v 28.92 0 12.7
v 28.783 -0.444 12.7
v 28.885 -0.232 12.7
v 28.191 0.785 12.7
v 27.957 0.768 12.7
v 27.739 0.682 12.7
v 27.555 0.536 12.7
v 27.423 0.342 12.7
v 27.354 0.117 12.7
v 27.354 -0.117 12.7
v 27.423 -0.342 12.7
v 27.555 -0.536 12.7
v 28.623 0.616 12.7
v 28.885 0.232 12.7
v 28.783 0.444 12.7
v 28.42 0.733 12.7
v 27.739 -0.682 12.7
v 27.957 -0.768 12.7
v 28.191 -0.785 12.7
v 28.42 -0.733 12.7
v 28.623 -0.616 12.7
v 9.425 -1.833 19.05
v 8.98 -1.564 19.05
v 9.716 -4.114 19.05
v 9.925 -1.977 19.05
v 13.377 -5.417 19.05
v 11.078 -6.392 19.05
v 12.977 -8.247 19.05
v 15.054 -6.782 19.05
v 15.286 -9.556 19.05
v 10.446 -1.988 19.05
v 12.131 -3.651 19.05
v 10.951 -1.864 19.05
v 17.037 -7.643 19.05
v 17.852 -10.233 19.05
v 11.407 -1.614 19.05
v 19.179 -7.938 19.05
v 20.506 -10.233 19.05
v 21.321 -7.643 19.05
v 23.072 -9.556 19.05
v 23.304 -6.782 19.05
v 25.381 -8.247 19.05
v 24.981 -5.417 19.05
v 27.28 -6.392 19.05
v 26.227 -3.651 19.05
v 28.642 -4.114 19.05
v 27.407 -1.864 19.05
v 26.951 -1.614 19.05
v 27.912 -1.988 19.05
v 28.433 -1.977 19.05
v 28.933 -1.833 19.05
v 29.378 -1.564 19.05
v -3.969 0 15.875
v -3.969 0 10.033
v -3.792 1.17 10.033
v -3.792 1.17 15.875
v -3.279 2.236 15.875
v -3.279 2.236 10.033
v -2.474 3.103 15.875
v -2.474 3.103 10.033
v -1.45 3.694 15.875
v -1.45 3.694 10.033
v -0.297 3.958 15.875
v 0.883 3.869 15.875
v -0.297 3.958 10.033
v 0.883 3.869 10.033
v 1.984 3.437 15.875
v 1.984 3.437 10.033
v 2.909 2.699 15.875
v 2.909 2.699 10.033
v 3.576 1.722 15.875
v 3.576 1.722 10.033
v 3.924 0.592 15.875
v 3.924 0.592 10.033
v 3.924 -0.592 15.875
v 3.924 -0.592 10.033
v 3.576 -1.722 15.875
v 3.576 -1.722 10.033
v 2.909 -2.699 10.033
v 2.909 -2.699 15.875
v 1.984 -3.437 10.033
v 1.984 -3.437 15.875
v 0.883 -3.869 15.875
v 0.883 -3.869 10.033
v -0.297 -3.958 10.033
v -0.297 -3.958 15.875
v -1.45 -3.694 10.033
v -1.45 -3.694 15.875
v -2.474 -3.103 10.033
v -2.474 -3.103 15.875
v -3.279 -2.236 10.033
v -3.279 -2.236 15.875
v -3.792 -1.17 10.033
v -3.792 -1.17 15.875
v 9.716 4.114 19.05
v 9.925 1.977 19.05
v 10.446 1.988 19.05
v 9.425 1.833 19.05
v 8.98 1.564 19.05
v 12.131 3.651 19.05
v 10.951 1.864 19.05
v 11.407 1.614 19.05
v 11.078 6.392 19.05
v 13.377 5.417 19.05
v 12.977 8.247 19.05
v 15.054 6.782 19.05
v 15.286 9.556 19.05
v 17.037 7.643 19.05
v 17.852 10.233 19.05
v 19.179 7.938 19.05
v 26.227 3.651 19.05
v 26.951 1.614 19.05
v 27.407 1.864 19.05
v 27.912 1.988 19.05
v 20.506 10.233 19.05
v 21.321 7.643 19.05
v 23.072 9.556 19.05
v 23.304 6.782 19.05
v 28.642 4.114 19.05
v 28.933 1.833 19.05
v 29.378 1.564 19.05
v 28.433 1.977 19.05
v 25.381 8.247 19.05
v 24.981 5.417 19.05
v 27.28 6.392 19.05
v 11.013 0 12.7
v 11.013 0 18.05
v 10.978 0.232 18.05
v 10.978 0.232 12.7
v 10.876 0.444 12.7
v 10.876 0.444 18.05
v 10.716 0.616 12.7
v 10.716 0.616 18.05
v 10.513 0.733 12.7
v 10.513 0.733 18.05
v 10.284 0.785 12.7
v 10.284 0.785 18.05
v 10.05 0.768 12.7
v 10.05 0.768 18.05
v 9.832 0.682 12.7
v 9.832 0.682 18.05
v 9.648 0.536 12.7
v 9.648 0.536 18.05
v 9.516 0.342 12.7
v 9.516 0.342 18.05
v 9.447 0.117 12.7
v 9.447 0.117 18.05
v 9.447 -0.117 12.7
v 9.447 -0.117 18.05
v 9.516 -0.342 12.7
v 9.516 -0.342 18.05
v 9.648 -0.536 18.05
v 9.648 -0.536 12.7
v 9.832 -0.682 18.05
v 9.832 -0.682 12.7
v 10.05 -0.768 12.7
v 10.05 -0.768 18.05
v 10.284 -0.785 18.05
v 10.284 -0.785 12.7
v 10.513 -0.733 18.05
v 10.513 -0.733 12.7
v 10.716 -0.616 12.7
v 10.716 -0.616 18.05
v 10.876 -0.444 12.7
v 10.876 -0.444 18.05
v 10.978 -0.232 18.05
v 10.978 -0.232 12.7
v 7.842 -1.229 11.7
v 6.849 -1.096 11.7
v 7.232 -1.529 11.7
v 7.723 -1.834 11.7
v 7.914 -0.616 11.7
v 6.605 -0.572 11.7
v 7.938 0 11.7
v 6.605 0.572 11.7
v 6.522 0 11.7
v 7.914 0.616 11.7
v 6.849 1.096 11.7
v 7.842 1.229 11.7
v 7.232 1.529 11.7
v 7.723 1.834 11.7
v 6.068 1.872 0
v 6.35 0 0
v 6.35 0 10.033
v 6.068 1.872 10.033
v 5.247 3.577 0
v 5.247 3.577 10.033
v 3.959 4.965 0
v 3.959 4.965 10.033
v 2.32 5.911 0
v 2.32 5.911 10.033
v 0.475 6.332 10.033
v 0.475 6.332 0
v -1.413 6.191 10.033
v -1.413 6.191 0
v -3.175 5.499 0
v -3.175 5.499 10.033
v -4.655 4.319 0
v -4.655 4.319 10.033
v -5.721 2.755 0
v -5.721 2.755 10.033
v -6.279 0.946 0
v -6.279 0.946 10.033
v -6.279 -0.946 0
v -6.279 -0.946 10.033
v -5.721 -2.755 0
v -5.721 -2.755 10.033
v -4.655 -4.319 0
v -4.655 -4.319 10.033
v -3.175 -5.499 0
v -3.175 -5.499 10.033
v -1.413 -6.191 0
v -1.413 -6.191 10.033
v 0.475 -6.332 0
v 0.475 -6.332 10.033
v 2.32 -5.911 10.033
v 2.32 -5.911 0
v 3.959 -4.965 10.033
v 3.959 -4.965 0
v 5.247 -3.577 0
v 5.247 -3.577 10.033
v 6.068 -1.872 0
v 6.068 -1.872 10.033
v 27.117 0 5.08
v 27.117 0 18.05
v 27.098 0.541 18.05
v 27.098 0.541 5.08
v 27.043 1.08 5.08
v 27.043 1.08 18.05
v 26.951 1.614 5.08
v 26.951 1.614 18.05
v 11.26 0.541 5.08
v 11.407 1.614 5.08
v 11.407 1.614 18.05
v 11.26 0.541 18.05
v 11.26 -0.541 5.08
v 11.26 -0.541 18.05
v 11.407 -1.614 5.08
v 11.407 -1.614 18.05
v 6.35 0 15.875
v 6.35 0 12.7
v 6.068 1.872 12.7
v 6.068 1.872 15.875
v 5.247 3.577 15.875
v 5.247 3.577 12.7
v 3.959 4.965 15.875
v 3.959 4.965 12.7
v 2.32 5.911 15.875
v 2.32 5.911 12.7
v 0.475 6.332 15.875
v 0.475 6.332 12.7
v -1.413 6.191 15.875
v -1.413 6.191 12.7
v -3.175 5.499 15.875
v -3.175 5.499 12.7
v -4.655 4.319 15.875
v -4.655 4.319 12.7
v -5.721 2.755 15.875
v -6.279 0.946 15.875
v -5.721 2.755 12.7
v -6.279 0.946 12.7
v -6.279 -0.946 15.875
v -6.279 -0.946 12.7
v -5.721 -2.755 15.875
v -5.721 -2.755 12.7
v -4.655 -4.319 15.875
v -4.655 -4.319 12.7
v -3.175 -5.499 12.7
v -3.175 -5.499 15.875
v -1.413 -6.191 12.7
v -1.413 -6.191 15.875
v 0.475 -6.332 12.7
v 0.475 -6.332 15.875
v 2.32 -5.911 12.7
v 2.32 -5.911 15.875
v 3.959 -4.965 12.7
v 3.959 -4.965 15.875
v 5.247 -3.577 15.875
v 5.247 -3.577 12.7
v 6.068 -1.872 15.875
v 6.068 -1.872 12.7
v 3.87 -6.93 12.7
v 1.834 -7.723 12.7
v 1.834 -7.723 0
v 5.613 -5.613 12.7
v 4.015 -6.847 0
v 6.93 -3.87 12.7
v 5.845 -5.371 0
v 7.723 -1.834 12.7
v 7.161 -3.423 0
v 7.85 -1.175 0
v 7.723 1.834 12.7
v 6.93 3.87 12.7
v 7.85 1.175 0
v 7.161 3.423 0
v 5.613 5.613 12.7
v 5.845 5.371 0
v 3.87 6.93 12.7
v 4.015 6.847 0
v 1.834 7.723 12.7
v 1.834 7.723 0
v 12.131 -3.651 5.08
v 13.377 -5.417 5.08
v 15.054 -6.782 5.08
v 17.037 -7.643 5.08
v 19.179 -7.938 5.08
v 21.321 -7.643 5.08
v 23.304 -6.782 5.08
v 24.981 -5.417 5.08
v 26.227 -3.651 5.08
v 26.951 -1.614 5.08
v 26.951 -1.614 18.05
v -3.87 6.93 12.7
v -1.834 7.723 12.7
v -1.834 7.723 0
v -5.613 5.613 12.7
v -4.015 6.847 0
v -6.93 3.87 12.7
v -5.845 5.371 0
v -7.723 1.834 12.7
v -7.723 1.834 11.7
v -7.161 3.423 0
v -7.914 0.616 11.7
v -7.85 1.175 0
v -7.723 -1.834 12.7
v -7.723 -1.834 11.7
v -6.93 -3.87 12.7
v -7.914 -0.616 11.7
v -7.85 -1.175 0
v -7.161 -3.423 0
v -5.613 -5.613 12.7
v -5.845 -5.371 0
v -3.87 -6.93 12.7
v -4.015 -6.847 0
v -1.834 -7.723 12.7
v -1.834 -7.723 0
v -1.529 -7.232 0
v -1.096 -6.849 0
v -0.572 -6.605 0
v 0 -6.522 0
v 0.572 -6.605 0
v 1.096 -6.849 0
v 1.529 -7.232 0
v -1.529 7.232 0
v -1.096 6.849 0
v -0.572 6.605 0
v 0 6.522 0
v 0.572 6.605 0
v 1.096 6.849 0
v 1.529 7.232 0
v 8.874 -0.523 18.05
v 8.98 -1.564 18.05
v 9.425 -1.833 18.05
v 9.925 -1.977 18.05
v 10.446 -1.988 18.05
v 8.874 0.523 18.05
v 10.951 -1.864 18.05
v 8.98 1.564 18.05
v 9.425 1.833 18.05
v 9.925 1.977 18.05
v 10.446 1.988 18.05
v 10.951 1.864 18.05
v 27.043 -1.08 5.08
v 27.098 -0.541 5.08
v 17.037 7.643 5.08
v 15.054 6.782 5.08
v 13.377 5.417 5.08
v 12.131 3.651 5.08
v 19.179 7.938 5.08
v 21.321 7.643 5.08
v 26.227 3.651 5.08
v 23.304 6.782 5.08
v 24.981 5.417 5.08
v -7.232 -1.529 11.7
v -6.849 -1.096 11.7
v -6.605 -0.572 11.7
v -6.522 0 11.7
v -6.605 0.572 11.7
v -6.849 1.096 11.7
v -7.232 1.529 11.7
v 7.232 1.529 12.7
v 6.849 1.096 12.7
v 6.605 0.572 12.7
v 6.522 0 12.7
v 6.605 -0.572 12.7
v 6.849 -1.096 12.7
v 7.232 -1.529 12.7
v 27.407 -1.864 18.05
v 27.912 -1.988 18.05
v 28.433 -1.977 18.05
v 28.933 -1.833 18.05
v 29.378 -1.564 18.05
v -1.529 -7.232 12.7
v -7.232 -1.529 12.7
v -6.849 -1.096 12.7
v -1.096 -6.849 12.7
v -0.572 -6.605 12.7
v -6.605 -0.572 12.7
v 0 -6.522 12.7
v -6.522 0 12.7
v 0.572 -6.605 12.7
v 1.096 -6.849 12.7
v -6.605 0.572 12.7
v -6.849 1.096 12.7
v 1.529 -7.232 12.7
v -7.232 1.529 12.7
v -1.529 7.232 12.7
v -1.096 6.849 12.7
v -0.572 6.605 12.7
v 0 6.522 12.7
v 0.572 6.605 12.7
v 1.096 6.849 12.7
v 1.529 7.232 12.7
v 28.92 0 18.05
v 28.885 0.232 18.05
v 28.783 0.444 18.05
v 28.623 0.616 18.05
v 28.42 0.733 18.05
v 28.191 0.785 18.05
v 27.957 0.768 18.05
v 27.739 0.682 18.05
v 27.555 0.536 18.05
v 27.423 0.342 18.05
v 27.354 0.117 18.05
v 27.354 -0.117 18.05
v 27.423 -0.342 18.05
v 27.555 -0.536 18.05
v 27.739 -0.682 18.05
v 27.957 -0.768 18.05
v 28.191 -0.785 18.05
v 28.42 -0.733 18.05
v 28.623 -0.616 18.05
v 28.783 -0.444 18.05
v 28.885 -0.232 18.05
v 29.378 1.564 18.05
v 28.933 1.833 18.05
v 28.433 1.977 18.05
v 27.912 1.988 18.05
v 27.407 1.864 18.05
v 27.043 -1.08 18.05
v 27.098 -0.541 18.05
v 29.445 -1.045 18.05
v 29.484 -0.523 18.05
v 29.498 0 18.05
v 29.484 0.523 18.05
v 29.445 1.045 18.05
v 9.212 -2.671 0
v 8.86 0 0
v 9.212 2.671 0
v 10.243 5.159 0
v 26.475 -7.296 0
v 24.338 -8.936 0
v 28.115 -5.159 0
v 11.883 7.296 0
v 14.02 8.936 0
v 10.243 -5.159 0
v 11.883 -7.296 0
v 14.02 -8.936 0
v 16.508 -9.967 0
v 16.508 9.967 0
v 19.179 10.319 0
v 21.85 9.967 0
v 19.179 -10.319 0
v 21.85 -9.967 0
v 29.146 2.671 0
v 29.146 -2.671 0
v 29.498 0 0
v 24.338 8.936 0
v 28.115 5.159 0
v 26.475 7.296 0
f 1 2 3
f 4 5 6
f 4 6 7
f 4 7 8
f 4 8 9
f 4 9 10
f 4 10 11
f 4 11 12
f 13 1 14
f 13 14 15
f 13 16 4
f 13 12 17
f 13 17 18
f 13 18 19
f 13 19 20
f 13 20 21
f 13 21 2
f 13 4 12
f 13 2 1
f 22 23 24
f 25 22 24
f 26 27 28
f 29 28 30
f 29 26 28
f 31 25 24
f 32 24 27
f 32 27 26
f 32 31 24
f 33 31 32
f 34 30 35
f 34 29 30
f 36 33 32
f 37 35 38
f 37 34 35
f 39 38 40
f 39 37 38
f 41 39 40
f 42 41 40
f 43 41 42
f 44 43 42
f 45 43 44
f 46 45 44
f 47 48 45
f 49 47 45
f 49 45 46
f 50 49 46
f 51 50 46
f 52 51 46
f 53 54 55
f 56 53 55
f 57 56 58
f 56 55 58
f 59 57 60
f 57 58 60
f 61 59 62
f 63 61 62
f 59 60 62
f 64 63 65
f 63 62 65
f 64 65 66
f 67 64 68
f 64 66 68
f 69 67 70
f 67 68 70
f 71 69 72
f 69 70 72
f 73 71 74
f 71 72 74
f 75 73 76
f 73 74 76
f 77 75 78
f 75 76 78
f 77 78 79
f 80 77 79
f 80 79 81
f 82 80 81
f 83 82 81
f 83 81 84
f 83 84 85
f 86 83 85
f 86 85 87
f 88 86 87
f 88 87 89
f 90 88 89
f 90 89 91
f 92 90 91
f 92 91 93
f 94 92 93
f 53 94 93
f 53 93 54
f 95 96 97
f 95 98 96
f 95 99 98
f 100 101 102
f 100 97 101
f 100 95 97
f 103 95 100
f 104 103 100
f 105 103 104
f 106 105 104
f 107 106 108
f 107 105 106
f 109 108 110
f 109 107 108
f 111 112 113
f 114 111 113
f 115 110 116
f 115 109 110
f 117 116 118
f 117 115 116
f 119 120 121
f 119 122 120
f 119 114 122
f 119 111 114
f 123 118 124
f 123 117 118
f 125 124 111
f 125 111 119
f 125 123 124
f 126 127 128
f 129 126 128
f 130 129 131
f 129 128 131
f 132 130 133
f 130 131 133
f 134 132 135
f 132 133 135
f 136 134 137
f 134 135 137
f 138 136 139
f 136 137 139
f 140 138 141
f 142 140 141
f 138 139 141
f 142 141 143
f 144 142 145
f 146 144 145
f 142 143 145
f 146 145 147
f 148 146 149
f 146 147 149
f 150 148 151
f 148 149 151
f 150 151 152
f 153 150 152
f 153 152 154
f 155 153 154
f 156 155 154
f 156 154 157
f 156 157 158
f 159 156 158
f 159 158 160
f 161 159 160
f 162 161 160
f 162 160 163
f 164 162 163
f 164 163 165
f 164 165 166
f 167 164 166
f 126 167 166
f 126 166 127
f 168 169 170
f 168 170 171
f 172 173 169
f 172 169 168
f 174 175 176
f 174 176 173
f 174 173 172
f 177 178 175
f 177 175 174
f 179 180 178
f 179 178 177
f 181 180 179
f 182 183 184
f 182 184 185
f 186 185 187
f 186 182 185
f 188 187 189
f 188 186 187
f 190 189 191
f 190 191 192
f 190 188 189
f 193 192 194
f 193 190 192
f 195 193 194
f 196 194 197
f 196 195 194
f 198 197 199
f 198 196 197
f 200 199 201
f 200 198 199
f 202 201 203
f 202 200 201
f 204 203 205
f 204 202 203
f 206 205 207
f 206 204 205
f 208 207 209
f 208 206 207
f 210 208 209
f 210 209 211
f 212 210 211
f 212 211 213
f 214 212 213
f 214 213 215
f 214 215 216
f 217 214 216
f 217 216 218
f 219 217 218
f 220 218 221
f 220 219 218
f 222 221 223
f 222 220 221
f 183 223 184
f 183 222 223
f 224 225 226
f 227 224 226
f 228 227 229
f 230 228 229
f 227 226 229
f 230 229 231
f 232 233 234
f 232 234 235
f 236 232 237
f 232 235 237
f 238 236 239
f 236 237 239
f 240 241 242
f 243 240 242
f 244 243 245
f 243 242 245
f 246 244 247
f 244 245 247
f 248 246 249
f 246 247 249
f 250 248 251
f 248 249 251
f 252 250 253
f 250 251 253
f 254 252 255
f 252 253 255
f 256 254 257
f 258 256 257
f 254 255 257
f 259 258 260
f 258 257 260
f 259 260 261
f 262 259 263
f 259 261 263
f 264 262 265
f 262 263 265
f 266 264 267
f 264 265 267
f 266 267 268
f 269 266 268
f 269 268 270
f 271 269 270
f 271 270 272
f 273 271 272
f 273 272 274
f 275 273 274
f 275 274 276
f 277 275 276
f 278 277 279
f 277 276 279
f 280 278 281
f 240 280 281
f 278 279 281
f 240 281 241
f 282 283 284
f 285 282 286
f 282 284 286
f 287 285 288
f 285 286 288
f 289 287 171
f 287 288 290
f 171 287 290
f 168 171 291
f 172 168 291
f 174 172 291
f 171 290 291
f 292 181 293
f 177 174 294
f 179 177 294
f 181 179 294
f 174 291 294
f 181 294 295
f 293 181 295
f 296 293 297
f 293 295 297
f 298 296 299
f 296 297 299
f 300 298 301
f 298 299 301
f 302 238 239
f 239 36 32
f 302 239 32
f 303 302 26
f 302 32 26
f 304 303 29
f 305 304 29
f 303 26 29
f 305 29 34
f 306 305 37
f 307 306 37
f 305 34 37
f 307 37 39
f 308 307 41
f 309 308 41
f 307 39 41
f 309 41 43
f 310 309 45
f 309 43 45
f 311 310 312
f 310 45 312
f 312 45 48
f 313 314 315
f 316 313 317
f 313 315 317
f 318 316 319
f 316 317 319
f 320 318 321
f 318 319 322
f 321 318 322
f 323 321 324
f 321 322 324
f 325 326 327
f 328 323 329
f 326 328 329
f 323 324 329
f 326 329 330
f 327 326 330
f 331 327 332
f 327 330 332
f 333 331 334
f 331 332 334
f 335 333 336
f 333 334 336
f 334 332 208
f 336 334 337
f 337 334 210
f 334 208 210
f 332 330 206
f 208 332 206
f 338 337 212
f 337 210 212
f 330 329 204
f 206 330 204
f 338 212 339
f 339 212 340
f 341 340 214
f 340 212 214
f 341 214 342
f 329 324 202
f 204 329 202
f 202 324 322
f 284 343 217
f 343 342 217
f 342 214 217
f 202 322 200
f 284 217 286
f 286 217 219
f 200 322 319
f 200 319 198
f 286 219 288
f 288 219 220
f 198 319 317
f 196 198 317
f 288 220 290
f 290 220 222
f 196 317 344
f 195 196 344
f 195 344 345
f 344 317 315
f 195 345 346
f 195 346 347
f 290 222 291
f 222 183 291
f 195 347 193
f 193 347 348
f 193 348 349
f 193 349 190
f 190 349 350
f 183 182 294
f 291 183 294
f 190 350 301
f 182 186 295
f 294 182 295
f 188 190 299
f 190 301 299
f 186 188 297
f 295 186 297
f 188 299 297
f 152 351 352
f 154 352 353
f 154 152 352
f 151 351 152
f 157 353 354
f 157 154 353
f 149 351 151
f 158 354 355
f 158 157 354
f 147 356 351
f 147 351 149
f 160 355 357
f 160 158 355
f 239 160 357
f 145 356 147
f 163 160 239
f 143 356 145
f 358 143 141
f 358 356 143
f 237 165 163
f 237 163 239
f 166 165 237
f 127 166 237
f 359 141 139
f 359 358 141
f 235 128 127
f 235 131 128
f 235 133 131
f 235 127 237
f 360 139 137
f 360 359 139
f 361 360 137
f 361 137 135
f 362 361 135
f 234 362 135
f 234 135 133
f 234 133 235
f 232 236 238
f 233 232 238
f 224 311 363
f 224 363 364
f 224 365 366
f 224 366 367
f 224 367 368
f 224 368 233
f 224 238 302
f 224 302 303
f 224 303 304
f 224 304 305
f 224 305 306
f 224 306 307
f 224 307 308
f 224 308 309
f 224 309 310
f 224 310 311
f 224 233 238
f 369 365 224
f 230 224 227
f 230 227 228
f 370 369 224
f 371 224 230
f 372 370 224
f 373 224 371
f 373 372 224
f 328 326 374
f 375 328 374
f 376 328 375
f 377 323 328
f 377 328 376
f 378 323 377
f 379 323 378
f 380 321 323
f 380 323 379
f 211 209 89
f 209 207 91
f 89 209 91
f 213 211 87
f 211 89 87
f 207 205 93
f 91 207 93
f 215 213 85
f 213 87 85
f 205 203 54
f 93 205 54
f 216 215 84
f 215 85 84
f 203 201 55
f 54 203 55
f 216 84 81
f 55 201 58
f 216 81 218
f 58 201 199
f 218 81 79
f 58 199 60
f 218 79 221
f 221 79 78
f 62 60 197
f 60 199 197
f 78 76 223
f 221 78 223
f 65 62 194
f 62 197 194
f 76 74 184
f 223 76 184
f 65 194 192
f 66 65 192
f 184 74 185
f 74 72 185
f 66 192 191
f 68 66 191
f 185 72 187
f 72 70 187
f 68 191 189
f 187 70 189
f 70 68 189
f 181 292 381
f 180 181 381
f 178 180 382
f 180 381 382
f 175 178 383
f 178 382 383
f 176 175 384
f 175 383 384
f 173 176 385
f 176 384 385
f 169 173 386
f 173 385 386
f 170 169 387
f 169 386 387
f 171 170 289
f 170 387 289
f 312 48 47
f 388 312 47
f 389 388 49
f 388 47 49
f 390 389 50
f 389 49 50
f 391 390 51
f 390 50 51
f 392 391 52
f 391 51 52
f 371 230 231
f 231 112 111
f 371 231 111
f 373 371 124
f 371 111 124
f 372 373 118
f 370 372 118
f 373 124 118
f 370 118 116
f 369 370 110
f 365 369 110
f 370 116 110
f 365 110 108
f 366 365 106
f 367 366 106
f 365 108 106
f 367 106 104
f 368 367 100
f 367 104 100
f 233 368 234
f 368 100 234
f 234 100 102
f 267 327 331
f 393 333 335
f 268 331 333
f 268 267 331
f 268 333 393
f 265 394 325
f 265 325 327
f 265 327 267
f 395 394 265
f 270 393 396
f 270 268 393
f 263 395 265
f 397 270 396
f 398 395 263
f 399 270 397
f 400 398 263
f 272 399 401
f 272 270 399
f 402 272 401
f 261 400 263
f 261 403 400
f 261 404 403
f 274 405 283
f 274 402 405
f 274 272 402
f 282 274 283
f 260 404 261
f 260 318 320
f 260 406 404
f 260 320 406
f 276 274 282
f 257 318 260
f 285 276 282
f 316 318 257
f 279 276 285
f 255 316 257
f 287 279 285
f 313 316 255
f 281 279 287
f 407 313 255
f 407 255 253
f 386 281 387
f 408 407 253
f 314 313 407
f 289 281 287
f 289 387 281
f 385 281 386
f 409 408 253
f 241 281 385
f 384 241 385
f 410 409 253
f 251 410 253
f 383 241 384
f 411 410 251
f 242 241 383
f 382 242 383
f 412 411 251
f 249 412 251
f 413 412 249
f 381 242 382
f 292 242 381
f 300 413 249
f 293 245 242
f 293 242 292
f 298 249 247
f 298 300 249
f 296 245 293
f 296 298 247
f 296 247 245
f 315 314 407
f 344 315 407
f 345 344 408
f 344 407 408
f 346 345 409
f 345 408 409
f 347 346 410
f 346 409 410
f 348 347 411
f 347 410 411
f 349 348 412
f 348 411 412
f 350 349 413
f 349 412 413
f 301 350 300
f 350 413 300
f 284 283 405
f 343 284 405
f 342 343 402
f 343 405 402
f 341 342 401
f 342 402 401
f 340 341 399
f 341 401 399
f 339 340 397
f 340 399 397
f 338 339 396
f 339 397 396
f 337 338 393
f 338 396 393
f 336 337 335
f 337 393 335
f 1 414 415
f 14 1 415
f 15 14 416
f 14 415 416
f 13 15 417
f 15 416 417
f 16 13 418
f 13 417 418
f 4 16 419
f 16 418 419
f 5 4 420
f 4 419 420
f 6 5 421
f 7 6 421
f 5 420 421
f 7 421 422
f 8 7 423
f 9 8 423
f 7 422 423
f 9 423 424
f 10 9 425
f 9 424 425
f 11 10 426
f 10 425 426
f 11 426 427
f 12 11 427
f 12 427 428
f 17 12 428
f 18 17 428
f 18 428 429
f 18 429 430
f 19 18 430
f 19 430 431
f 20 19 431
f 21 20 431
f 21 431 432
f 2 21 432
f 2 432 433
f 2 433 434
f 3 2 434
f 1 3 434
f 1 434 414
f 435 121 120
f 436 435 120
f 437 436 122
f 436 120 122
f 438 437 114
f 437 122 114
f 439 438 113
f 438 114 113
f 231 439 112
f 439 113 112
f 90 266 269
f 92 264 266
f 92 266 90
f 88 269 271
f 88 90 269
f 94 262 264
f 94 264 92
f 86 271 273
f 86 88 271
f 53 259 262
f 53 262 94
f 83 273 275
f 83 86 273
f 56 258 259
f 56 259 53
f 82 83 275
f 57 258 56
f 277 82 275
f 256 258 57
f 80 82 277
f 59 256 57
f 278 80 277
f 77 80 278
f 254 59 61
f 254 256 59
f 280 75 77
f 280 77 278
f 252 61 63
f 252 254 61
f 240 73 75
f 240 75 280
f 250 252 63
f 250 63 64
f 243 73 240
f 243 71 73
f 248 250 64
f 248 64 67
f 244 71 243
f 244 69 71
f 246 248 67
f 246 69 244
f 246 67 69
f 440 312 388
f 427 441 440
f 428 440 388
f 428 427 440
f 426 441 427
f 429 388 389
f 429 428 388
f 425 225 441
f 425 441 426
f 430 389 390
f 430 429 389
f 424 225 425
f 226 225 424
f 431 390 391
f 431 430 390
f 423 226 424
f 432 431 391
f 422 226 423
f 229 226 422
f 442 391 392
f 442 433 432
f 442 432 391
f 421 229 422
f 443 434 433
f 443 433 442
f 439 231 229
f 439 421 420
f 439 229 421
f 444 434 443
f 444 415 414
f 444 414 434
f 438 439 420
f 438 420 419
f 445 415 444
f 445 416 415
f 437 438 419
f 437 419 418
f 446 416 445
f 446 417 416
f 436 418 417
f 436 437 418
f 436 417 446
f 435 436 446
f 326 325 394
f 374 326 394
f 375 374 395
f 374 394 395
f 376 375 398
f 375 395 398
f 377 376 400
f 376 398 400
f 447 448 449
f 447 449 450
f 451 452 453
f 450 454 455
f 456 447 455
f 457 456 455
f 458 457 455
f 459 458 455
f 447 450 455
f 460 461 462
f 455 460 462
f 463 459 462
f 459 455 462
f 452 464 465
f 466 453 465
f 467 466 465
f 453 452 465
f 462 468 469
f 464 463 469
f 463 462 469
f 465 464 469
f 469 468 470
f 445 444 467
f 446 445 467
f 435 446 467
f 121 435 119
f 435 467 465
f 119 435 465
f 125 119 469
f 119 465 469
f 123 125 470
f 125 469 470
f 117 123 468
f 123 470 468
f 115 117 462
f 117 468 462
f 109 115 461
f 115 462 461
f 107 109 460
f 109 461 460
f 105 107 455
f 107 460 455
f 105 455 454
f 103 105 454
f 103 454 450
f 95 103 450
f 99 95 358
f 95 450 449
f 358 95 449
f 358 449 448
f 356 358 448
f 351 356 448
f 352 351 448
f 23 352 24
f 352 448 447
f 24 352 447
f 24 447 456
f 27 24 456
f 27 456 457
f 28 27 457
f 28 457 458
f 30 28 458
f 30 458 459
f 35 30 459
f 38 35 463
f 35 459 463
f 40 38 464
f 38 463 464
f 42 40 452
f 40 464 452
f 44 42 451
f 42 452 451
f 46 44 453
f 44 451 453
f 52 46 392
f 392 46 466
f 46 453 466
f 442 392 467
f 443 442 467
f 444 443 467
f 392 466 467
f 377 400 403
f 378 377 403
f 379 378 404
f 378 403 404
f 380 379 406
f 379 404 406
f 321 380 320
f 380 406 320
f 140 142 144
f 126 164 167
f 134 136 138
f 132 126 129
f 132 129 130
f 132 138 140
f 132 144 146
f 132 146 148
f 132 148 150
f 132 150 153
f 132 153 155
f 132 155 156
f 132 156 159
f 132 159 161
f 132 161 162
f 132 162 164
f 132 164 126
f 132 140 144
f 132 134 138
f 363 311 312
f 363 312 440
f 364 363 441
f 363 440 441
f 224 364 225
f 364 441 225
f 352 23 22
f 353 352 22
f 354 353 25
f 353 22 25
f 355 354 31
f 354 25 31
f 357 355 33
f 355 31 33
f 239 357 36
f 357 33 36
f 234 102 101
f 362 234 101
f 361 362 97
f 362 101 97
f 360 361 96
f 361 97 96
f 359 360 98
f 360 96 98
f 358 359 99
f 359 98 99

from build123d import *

# Parameters (mm, degrees)
F0_R      = 7.9375
F0_R_2    = 6.35
F1_DEPTH  = 12.7
F3_DEPTH  = 12.701
F4_DEPTH  = 1
F2_R      = 6.35
F5_DEPTH  = 3.175
F7_D      = 7.9375
F8_R      = 10.31875
F8_R_2    = 7.9375
F9_DEPTH  = 19.05
F11_DEPTH = 13.97
F10_R     = 0.7874
F12_DEPTH = 6.35
F13_DEPTH = 1
F14_DEPTH = 10.033


with BuildPart() as f1:
    # F0 (on Top) → F1 (new body)
    with BuildSketch(Plane.XY):
        Circle(F0_R)
        Circle(F0_R_2, mode=Mode.SUBTRACT)
        Circle(F0_R_2)
    extrude(amount=F1_DEPTH)

    # F2 (on face) → F3 (cut, through all)
    with BuildSketch(Plane.XY.offset(12.7)):
        with BuildLine():
            ThreePointArc((1.8335229418, 7.722829784), (0, 7.9375), (-1.8335229418, 7.722829784))
            ThreePointArc((-1.8335229418, 7.722829784), (0, 6.5217), (1.8335229418, 7.722829784))
        make_face()
        with BuildLine():
            ThreePointArc((1.8335229418, -7.722829784), (0, -6.5217), (-1.8335229418, -7.722829784))
            ThreePointArc((-1.8335229418, -7.722829784), (0, -7.9375), (1.8335229418, -7.722829784))
        make_face()
    extrude(amount=-F3_DEPTH, mode=Mode.SUBTRACT)

    # F2 (on face) → F4 (cut)
    with BuildSketch(Plane.XY.offset(12.7)):
        with BuildLine():
            ThreePointArc((-6.5217, 0), (-6.8487175685, 1.0959606672), (-7.722829784, 1.8335229418))
            ThreePointArc((-7.722829784, 1.8335229418), (-7.9375, 0), (-7.722829784, -1.8335229418))
            ThreePointArc((-7.722829784, -1.8335229418), (-6.8487175685, -1.0959606672), (-6.5217, 0))
        make_face()
        with BuildLine():
            ThreePointArc((7.9375, 0), (7.8836497785, 0.9230235208), (7.722829784, 1.8335229418))
            ThreePointArc((7.722829784, 1.8335229418), (6.5217, 0), (7.722829784, -1.8335229418))
            ThreePointArc((7.722829784, -1.8335229418), (7.8836497785, -0.9230235208), (7.9375, 0))
        make_face()
    extrude(amount=-F4_DEPTH, mode=Mode.SUBTRACT)

    # F2 (on face) → F5 (join)
    with BuildSketch(Plane.XY.offset(12.7)):
        Circle(F2_R)
    extrude(amount=F5_DEPTH)

    # F7 (through all)
    with Locations(Plane.XY.offset(15.875)):
        with Locations((0, 0)):
            Hole(F7_D / 2)

    # F0 (on Top) → F14 (cut)
    with BuildSketch(Plane.XY):
        Circle(F0_R_2)
    extrude(amount=F14_DEPTH, mode=Mode.SUBTRACT)


with BuildPart() as f9:
    # F8 (on Top) → F9 (new body)
    with BuildSketch(Plane.XY):
        with Locations((19.1790115059, 0)):
            Circle(F8_R)
        with Locations((19.1790115059, 0)):
            Circle(F8_R_2, mode=Mode.SUBTRACT)
        with Locations((19.1790115059, 0)):
            Circle(F8_R_2)
    extrude(amount=F9_DEPTH)

    # F10 (on face) → F11 (cut)
    with BuildSketch(Plane.XY.offset(19.05)):
        with BuildLine():
            ThreePointArc((26.9507805627, -1.6135402003), (27.0749700652, -0.8110145997), (27.1165115059, 0))
            ThreePointArc((27.1165115059, 0), (27.0749700652, 0.8110145997), (26.9507805627, 1.6135402003))
            ThreePointArc((26.9507805627, 1.6135402003), (19.1790115059, 7.9375), (11.4072424492, 1.6135402003))
            ThreePointArc((11.4072424492, 1.6135402003), (11.2415115059, 0), (11.4072424492, -1.6135402003))
            ThreePointArc((11.4072424492, -1.6135402003), (19.1790115059, -7.9375), (26.9507805627, -1.6135402003))
        make_face()
    extrude(amount=-F11_DEPTH, mode=Mode.SUBTRACT)

    # F10 (on face) → F12 (cut)
    with BuildSketch(Plane.XY.offset(19.05)):
        with Locations((10.2255115059, 0)):
            Circle(F10_R)
        with Locations((28.1325115059, 0)):
            Circle(F10_R)
    extrude(amount=-F12_DEPTH, mode=Mode.SUBTRACT)

    # F10 (on face) → F13 (cut)
    with BuildSketch(Plane.XY.offset(19.05)):
        with BuildLine():
            ThreePointArc((11.4072424492, -1.6135402003), (11.2415115059, 0), (11.4072424492, 1.6135402003))
            ThreePointArc((11.4072424492, 1.6135402003), (10.1850977046, 1.9995916395), (8.97954963, 1.5644740342))
            ThreePointArc((8.97954963, 1.5644740342), (8.8602615059, 0), (8.97954963, -1.5644740342))
            ThreePointArc((8.97954963, -1.5644740342), (10.1850977046, -1.9995916395), (11.4072424492, -1.6135402003))
        make_face()
        with Locations((10.2255115059, 0)):
            Circle(F10_R, mode=Mode.SUBTRACT)
        with BuildLine():
            ThreePointArc((26.9507805627, 1.6135402003), (27.0749700652, 0.8110145997), (27.1165115059, 0))
            ThreePointArc((27.1165115059, 0), (27.0749700652, -0.8110145997), (26.9507805627, -1.6135402003))
            ThreePointArc((26.9507805627, -1.6135402003), (28.1729253073, -1.9995916395), (29.3784733819, -1.5644740342))
            ThreePointArc((29.3784733819, -1.5644740342), (29.4678962559, -0.784507594), (29.4977615059, 0))
            ThreePointArc((29.4977615059, 0), (29.4678962559, 0.784507594), (29.3784733819, 1.5644740342))
            ThreePointArc((29.3784733819, 1.5644740342), (28.1729253073, 1.9995916395), (26.9507805627, 1.6135402003))
        make_face()
        with Locations((28.1325115059, 0)):
            Circle(F10_R, mode=Mode.SUBTRACT)
    extrude(amount=-F13_DEPTH, mode=Mode.SUBTRACT)


solid = Compound([f1.part, f9.part])
